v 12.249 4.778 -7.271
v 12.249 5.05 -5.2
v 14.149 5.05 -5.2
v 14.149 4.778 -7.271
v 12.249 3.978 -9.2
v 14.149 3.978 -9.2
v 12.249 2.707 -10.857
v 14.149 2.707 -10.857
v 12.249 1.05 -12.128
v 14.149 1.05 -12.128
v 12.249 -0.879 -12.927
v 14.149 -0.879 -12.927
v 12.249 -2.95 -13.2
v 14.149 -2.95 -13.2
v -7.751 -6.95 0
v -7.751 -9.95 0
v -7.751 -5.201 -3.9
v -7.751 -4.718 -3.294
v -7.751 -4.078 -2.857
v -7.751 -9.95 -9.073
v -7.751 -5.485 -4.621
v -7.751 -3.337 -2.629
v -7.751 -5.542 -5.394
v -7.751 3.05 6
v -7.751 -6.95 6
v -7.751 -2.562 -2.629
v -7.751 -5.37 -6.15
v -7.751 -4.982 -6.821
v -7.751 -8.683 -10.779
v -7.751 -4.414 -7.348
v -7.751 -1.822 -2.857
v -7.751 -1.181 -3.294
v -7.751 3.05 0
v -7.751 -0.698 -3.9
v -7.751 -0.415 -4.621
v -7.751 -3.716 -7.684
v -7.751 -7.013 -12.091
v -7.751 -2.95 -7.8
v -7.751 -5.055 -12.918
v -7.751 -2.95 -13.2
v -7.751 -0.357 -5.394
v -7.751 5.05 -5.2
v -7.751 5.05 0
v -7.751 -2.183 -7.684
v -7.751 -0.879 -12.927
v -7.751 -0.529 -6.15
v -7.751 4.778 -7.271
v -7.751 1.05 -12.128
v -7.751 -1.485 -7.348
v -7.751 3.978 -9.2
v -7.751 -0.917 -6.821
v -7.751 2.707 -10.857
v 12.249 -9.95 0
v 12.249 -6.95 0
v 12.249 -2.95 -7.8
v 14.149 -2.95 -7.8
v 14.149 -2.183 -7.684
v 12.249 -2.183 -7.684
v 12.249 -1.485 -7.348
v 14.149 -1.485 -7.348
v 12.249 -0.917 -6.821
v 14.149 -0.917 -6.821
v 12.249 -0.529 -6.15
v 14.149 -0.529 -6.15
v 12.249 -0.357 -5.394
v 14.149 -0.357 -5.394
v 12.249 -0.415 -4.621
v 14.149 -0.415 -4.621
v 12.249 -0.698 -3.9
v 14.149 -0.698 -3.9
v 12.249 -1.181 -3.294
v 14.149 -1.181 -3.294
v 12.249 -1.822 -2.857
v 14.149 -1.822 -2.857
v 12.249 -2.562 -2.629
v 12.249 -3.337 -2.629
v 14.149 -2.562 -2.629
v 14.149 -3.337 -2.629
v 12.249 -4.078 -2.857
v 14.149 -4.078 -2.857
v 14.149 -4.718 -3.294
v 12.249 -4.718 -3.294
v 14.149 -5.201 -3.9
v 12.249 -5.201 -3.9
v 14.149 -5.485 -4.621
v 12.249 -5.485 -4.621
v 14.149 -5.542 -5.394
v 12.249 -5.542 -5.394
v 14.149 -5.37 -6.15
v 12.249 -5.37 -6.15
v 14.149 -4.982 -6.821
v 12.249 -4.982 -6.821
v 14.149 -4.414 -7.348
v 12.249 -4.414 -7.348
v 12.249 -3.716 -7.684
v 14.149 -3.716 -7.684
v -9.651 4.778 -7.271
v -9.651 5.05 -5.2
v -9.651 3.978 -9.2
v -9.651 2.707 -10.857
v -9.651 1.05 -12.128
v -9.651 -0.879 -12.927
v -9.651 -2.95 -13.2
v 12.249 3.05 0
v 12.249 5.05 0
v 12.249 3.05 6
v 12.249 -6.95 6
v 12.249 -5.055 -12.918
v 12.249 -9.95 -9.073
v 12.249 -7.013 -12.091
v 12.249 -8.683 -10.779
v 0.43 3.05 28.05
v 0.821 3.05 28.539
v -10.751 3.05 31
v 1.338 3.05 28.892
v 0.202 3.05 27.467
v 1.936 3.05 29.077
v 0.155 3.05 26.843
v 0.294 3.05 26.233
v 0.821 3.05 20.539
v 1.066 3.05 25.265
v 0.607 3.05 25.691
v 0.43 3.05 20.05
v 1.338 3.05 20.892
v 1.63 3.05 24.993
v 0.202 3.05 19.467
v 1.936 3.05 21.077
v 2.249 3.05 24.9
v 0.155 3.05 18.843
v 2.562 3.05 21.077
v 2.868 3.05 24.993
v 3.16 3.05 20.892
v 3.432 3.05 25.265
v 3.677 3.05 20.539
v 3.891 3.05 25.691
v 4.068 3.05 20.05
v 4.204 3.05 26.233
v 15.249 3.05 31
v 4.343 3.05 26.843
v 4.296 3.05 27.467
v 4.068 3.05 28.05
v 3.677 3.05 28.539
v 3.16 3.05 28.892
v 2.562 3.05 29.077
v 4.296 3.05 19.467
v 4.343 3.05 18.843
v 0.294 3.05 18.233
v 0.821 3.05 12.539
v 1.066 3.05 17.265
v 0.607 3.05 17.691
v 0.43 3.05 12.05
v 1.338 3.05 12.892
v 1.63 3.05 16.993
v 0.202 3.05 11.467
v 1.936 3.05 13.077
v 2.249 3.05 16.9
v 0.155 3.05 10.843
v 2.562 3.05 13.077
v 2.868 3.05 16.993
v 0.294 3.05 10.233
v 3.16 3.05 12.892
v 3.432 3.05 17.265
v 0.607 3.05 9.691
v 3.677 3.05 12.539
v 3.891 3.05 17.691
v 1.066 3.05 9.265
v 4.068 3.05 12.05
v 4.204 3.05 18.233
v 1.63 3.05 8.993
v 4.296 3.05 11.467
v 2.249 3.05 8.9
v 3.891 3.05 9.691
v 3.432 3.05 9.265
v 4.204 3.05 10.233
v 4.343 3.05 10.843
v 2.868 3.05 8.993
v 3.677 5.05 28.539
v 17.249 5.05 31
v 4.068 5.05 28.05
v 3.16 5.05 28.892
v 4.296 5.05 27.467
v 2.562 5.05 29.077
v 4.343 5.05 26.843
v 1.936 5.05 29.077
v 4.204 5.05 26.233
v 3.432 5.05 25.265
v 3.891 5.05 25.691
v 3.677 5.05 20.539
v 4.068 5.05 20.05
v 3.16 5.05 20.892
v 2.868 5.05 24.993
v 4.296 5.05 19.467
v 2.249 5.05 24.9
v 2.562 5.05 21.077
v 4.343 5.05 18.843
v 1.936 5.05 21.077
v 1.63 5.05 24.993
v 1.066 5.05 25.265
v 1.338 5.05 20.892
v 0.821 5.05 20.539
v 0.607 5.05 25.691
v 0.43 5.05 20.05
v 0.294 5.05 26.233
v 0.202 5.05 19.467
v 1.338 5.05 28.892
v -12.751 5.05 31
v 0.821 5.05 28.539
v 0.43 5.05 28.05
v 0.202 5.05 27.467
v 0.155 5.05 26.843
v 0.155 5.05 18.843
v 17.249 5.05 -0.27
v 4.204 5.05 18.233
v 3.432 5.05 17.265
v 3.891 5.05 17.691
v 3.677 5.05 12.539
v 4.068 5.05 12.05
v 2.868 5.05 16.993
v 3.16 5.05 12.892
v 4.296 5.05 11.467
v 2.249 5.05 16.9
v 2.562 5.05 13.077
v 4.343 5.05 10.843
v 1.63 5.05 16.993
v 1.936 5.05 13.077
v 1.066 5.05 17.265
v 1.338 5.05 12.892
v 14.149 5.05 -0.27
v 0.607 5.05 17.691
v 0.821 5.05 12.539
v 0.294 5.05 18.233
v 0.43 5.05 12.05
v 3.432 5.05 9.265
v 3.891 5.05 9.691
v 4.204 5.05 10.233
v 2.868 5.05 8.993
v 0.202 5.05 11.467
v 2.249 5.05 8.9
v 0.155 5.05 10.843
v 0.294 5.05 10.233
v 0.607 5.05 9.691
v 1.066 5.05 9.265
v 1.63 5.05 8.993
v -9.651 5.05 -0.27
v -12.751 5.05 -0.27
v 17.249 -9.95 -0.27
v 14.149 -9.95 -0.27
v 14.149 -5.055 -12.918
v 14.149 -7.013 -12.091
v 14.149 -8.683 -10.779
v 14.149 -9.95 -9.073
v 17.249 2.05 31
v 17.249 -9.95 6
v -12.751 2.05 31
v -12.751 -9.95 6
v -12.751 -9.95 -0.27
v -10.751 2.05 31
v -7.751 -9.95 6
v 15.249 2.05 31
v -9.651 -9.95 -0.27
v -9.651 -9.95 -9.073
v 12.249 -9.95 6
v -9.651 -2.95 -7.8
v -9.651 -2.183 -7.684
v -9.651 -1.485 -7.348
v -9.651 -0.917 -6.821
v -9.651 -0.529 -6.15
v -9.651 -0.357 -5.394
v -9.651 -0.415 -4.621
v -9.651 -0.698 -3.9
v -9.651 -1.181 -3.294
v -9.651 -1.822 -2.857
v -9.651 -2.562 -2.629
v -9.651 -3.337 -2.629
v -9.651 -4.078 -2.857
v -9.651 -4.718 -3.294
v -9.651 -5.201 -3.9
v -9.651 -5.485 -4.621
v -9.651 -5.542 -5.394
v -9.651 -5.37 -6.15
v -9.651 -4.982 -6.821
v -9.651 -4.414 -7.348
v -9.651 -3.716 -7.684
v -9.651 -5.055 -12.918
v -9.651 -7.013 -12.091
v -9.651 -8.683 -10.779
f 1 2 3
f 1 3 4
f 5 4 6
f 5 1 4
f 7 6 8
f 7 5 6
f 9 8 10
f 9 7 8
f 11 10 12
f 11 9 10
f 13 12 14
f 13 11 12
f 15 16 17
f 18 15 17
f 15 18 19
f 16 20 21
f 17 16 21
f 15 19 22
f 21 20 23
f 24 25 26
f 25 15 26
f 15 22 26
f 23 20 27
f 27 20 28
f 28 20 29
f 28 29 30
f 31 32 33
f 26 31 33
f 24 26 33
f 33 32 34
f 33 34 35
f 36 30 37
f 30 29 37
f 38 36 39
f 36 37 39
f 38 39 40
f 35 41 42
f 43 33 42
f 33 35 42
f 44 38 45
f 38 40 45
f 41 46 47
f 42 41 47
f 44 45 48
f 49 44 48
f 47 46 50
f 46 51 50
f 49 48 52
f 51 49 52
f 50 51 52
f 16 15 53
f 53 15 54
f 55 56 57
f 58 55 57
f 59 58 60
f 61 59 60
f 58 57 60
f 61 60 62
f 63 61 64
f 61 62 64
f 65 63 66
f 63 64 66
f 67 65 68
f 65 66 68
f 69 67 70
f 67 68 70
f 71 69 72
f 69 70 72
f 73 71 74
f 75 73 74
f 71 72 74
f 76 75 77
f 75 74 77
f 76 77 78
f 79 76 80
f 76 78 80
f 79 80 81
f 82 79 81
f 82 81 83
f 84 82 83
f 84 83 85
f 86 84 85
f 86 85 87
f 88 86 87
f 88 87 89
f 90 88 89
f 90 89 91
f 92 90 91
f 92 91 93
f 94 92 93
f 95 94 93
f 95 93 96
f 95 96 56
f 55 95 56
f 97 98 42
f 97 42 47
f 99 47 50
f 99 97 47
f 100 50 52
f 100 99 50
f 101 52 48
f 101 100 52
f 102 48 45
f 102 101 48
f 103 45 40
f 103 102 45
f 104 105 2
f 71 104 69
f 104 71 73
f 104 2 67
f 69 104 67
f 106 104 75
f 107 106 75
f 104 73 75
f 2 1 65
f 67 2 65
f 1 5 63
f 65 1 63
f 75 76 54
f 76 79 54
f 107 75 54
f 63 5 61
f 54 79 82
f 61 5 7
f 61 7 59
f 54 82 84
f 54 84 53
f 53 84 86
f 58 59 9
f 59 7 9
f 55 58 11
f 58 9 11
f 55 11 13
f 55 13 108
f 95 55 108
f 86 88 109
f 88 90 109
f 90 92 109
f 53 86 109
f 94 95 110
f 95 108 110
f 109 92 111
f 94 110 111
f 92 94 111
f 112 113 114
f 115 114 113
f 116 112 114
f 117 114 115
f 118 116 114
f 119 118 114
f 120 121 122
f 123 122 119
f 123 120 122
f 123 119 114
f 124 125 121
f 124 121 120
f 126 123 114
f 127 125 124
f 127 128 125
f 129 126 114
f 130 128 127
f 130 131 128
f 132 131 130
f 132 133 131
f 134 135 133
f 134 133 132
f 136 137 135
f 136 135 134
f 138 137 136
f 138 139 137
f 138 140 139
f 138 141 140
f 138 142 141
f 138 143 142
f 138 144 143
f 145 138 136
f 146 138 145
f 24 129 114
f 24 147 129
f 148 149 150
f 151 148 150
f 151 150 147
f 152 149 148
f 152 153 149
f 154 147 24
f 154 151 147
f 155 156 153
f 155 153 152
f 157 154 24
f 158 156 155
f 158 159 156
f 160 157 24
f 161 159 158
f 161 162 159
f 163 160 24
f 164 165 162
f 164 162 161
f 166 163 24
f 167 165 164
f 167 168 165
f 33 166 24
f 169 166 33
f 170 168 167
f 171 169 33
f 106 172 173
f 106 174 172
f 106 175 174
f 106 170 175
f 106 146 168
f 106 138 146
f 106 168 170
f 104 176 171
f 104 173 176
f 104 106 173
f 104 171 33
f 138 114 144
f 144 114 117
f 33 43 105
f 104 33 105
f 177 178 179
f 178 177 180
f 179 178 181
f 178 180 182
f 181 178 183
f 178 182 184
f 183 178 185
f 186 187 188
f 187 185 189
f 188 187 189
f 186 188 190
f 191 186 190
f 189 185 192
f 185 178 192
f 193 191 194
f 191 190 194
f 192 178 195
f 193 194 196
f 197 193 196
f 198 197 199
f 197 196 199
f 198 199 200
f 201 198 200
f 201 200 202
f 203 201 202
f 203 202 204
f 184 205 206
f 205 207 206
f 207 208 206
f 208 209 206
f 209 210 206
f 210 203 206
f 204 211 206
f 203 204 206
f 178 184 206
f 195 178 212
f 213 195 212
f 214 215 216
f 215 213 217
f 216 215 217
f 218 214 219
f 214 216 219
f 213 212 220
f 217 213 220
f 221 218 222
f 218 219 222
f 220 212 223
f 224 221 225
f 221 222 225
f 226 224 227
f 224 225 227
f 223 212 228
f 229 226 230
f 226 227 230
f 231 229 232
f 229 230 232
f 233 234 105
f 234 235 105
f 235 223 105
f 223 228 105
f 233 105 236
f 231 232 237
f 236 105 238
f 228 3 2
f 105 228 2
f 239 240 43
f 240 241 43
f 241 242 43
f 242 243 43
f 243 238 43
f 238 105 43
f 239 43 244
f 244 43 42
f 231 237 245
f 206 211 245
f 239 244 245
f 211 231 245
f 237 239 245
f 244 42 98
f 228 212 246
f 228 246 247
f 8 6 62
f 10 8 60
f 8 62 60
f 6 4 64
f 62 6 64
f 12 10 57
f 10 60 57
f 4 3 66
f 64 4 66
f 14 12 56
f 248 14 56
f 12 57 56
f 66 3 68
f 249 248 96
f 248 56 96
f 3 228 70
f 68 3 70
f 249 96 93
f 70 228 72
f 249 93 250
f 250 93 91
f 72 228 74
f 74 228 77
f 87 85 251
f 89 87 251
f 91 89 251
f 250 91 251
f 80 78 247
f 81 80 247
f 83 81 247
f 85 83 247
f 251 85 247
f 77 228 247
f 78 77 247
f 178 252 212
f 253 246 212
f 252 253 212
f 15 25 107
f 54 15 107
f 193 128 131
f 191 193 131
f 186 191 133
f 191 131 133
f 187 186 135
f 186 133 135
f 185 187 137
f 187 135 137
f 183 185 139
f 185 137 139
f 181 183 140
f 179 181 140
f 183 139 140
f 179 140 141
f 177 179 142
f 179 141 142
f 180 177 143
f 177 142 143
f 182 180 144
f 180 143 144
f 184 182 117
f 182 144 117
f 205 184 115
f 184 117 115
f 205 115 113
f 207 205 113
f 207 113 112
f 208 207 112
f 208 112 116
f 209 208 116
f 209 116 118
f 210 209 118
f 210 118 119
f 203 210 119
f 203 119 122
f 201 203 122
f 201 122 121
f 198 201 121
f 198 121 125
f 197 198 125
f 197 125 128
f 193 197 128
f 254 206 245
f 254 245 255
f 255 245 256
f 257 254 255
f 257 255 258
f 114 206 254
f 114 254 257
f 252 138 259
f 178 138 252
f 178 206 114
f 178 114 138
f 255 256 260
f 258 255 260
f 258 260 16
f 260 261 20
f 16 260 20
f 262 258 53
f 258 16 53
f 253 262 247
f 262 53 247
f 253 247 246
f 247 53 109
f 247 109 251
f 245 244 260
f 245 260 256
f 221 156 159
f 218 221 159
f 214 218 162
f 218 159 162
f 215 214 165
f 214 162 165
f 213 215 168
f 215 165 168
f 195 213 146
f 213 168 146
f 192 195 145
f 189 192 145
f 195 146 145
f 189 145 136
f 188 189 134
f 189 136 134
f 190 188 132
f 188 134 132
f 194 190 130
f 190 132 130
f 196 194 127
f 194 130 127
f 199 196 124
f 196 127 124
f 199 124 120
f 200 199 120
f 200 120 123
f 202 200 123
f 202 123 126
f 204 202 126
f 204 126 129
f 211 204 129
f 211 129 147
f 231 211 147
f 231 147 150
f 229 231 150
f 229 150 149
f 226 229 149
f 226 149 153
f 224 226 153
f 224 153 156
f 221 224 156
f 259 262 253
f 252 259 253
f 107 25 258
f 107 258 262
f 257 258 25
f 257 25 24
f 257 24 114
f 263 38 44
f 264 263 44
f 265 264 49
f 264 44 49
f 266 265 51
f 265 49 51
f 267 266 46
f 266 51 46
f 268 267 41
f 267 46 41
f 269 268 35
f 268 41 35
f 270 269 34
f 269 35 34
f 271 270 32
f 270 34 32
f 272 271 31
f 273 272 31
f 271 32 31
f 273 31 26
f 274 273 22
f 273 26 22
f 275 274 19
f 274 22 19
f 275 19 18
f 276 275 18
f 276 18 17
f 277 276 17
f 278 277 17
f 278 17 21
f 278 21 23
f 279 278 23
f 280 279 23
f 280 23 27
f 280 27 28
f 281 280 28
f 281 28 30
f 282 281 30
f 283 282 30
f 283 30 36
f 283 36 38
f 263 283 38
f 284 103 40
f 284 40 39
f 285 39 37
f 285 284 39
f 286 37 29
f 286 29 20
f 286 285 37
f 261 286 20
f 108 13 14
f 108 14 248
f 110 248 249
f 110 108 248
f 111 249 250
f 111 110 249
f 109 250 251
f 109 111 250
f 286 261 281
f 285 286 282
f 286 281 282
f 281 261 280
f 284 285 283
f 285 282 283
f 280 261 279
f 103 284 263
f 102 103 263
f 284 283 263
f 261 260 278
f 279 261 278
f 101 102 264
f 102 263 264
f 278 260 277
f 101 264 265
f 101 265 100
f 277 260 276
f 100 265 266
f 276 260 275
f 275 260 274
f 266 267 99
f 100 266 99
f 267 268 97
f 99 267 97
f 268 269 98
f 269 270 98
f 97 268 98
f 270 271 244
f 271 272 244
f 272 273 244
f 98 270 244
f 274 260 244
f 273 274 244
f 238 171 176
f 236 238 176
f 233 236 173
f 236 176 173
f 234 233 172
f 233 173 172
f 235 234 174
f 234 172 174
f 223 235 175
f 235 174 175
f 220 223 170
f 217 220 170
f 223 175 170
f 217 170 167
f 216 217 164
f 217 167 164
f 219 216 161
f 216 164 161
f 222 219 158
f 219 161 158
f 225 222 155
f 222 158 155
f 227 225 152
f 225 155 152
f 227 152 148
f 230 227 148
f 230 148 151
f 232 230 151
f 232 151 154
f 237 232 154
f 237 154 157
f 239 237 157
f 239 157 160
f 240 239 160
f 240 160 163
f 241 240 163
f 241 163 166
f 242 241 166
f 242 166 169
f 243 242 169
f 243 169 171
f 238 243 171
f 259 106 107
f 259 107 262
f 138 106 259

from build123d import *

# Parameters (mm, degrees)
SKETCH_1_W               = 30
SKETCH_1_H               = 15
EXTRUDE_1_DEPTH          = 18
CUT_EXTRUDE_1_REACH      = 28.843
SKETCH_2_W               = 20
SKETCH_2_H               = 10
CUT_EXTRUDE_2_REACH      = 29.668
SKETCH_3_W               = 20
SKETCH_3_H               = 12
EXTRUDE_4_DEPTH          = 20
SKETCH_10_R              = 2.6
CUT_EXTRUDE_8_DEPTH      = 35.965796737
CUT_EXTRUDE_9_DEPTH      = 35.965796737
CUT_EXTRUDE_9_DEPTH_BACK = 35.965796737
SKETCH_12_W              = 1.696031958
SKETCH_12_H              = 15
SKETCH_17_W              = 3.1
SKETCH_17_H              = 15
EXTRUDE_8_DEPTH          = 0.27
EXTRUDE_9_DEPTH          = 13
CHAMFER_1_SIZE           = 25
CHAMFER_1_SIZE2          = 12
SKETCH_19_R              = 2.1
CUT_EXTRUDE_10_DEPTH     = 13
CHAMFER_2_SIZE           = 25
CHAMFER_2_SIZE_2         = 3


with BuildPart() as part:
    # 草圖1 → 填料-伸長1 (new body)
    with BuildSketch(Plane.XY):
        with Locations((2.249045701, -2.44972067)):
            Rectangle(SKETCH_1_W, SKETCH_1_H)
    extrude(amount=EXTRUDE_1_DEPTH)

    # 草圖2 → 除料-伸長1 (cut, up to next)
    with BuildSketch(Plane.XY.offset(18), mode=Mode.PRIVATE) as cut_extrude_1_sk1:
        with Locations((2.249045701, -1.94972067)):
            Rectangle(SKETCH_2_W, SKETCH_2_H)
    cut_extrude_1_tool1 = extrude(cut_extrude_1_sk1.sketch, amount=-CUT_EXTRUDE_1_REACH, mode=Mode.PRIVATE) & part.part
    add(cut_extrude_1_tool1.solids().sort_by_distance((2.249046, -1.949721, 18))[0], mode=Mode.SUBTRACT)

    # 草圖3 → 除料-伸長2 (cut, up to next)
    with BuildSketch(Plane(origin=(0, -6.94972067, 0), x_dir=(1, 0, 0), z_dir=(0, 1, 0)), mode=Mode.PRIVATE) as cut_extrude_2_sk1:
        with Locations((2.249045701, -12)):
            Rectangle(SKETCH_3_W, SKETCH_3_H)
    cut_extrude_2_tool1 = extrude(cut_extrude_2_sk1.sketch, amount=-CUT_EXTRUDE_2_REACH, mode=Mode.PRIVATE) & part.part
    add(cut_extrude_2_tool1.solids().sort_by_distance((2.249046, -6.949721, 12))[0], mode=Mode.SUBTRACT)

    # 草圖9 → 填料-伸長4 (add)
    with BuildSketch(Plane(origin=(0, 0, 0), x_dir=(-1, 0, 0), z_dir=(0, 0, -1))):
        Polygon((9.650954299, 5.05027933), (7.750954299, 5.05027933), (7.750954299, 3.05027933), (7.750954299, -6.94972067), (7.750954299, -9.94972067), (9.650954299, -9.94972067), align=None)
        Polygon((-12.249045701, 3.05027933), (-12.249045701, 5.05027933), (-14.149045701, 5.05027933), (-14.149045701, -9.94972067), (-12.249045701, -9.94972067), (-12.249045701, -6.94972067), align=None)
    extrude(amount=EXTRUDE_4_DEPTH)

    # 草圖10 → 除料-伸長8 (cut, through all)
    with BuildSketch(Plane(origin=(14.149045701, 0, 0), x_dir=(0, 0, -1), z_dir=(1, 0, 0))):
        with Locations((5.2, -2.94972067)):
            Circle(SKETCH_10_R)
    extrude(amount=-CUT_EXTRUDE_8_DEPTH, mode=Mode.SUBTRACT)

    # 草圖12 → 除料-伸長9 (cut, two sides: drawn at the far end of the back side and taken through both)
    with BuildSketch(Plane(origin=(14.149045701, 0, 0), x_dir=(0, 0, -1), z_dir=(1, 0, 0)).offset(-CUT_EXTRUDE_9_DEPTH_BACK)):
        with BuildLine():
            Line((18.303968042, 5.05027933), (5.2, 5.05027933))
            ThreePointArc((5.2, 5.05027933), (10.856854249, 2.707133579), (13.2, -2.94972067))
            ThreePointArc((13.2, -2.94972067), (12.091439137, -7.012732683), (9.072983346, -9.94972067))
            Line((9.072983346, -9.94972067), (18.303968042, -9.94972067))
            Line((18.303968042, -9.94972067), (18.303968042, 5.05027933))
        make_face()
        with Locations((19.151984021, -2.44972067)):
            Rectangle(SKETCH_12_W, SKETCH_12_H)
    extrude(amount=CUT_EXTRUDE_9_DEPTH + CUT_EXTRUDE_9_DEPTH_BACK, mode=Mode.SUBTRACT)

    # 草圖17 → 填料-伸長8 (add)
    with BuildSketch(Plane(origin=(0, 0, 0), x_dir=(-1, 0, 0), z_dir=(0, 0, -1))):
        with Locations((-15.699045701, -2.44972067)):
            Rectangle(SKETCH_17_W, SKETCH_17_H)
        with Locations((11.200954299, -2.44972067)):
            Rectangle(SKETCH_17_W, SKETCH_17_H)
    extrude(amount=EXTRUDE_8_DEPTH)

    # 草圖18 → 填料-伸長9 (add)
    with BuildSketch(Plane.XY.offset(18)):
        Polygon((-12.750954299, 5.05027933), (-12.750954299, -9.94972067), (-7.750954299, -9.94972067), (-7.750954299, 3.05027933), (12.249045701, 3.05027933), (12.249045701, -9.94972067), (17.249045701, -9.94972067), (17.249045701, 5.05027933), align=None)
    extrude(amount=EXTRUDE_9_DEPTH)

    # 導角1
    chamfer_1_edges = [part.edges().sort_by_distance(p)[0] for p in [
        (14.749045701, -9.94972067, 31),
        (-10.250954299, -9.94972067, 31),
    ]]
    chamfer_1_side = [part.faces().sort_by_distance(p)[0] for p in [
        (13.648461643, -9.94972067, -4.671491673),
    ]]
    chamfer(chamfer_1_edges, length=CHAMFER_1_SIZE, length2=CHAMFER_1_SIZE2, reference=chamfer_1_side[0])

    # 草圖19 → 除料-伸長10 (cut)
    with BuildSketch(Plane(origin=(0, 3.05027933, 0), x_dir=(-1, 0, 0), z_dir=(0, -1, 0))):
        with Locations(Location((-2.249045701, -27, 0), (0, 0, 90))):
            Circle(SKETCH_19_R)
        with Locations(Location((-2.249045701, -19, 0), (0, 0, 90))):
            Circle(SKETCH_19_R)
        with Locations(Location((-2.249045701, -11, 0), (0, 0, 90))):
            Circle(SKETCH_19_R)
    extrude(amount=-CUT_EXTRUDE_10_DEPTH, mode=Mode.SUBTRACT)

    # 導角2
    # the kernel refuses this chamfer: 25, 3 mm, written as the material it takes off along each edge
    with BuildSketch(Plane(origin=(12.249045701, 3.05027933, 31), x_dir=(-0.004583716135178889, 0, -0.9999894947180156), z_dir=(0, -1, 0)), Plane(origin=(-7.750954299, -62.93259543, 31), x_dir=(0.004583716135178923, 0, -0.9999894947180156), z_dir=(0, 1, 0))) as chamfer_2_piece_1:
        Polygon((CHAMFER_2_SIZE * 0.999989494718, CHAMFER_2_SIZE * 0.00458371613518), (-CHAMFER_2_SIZE_2 * 0.00458371613518, CHAMFER_2_SIZE_2 * 0.999989494718), (0, 0), align=None)
    extrude(amount=65.98287476, mode=Mode.SUBTRACT)


solid = part.part
